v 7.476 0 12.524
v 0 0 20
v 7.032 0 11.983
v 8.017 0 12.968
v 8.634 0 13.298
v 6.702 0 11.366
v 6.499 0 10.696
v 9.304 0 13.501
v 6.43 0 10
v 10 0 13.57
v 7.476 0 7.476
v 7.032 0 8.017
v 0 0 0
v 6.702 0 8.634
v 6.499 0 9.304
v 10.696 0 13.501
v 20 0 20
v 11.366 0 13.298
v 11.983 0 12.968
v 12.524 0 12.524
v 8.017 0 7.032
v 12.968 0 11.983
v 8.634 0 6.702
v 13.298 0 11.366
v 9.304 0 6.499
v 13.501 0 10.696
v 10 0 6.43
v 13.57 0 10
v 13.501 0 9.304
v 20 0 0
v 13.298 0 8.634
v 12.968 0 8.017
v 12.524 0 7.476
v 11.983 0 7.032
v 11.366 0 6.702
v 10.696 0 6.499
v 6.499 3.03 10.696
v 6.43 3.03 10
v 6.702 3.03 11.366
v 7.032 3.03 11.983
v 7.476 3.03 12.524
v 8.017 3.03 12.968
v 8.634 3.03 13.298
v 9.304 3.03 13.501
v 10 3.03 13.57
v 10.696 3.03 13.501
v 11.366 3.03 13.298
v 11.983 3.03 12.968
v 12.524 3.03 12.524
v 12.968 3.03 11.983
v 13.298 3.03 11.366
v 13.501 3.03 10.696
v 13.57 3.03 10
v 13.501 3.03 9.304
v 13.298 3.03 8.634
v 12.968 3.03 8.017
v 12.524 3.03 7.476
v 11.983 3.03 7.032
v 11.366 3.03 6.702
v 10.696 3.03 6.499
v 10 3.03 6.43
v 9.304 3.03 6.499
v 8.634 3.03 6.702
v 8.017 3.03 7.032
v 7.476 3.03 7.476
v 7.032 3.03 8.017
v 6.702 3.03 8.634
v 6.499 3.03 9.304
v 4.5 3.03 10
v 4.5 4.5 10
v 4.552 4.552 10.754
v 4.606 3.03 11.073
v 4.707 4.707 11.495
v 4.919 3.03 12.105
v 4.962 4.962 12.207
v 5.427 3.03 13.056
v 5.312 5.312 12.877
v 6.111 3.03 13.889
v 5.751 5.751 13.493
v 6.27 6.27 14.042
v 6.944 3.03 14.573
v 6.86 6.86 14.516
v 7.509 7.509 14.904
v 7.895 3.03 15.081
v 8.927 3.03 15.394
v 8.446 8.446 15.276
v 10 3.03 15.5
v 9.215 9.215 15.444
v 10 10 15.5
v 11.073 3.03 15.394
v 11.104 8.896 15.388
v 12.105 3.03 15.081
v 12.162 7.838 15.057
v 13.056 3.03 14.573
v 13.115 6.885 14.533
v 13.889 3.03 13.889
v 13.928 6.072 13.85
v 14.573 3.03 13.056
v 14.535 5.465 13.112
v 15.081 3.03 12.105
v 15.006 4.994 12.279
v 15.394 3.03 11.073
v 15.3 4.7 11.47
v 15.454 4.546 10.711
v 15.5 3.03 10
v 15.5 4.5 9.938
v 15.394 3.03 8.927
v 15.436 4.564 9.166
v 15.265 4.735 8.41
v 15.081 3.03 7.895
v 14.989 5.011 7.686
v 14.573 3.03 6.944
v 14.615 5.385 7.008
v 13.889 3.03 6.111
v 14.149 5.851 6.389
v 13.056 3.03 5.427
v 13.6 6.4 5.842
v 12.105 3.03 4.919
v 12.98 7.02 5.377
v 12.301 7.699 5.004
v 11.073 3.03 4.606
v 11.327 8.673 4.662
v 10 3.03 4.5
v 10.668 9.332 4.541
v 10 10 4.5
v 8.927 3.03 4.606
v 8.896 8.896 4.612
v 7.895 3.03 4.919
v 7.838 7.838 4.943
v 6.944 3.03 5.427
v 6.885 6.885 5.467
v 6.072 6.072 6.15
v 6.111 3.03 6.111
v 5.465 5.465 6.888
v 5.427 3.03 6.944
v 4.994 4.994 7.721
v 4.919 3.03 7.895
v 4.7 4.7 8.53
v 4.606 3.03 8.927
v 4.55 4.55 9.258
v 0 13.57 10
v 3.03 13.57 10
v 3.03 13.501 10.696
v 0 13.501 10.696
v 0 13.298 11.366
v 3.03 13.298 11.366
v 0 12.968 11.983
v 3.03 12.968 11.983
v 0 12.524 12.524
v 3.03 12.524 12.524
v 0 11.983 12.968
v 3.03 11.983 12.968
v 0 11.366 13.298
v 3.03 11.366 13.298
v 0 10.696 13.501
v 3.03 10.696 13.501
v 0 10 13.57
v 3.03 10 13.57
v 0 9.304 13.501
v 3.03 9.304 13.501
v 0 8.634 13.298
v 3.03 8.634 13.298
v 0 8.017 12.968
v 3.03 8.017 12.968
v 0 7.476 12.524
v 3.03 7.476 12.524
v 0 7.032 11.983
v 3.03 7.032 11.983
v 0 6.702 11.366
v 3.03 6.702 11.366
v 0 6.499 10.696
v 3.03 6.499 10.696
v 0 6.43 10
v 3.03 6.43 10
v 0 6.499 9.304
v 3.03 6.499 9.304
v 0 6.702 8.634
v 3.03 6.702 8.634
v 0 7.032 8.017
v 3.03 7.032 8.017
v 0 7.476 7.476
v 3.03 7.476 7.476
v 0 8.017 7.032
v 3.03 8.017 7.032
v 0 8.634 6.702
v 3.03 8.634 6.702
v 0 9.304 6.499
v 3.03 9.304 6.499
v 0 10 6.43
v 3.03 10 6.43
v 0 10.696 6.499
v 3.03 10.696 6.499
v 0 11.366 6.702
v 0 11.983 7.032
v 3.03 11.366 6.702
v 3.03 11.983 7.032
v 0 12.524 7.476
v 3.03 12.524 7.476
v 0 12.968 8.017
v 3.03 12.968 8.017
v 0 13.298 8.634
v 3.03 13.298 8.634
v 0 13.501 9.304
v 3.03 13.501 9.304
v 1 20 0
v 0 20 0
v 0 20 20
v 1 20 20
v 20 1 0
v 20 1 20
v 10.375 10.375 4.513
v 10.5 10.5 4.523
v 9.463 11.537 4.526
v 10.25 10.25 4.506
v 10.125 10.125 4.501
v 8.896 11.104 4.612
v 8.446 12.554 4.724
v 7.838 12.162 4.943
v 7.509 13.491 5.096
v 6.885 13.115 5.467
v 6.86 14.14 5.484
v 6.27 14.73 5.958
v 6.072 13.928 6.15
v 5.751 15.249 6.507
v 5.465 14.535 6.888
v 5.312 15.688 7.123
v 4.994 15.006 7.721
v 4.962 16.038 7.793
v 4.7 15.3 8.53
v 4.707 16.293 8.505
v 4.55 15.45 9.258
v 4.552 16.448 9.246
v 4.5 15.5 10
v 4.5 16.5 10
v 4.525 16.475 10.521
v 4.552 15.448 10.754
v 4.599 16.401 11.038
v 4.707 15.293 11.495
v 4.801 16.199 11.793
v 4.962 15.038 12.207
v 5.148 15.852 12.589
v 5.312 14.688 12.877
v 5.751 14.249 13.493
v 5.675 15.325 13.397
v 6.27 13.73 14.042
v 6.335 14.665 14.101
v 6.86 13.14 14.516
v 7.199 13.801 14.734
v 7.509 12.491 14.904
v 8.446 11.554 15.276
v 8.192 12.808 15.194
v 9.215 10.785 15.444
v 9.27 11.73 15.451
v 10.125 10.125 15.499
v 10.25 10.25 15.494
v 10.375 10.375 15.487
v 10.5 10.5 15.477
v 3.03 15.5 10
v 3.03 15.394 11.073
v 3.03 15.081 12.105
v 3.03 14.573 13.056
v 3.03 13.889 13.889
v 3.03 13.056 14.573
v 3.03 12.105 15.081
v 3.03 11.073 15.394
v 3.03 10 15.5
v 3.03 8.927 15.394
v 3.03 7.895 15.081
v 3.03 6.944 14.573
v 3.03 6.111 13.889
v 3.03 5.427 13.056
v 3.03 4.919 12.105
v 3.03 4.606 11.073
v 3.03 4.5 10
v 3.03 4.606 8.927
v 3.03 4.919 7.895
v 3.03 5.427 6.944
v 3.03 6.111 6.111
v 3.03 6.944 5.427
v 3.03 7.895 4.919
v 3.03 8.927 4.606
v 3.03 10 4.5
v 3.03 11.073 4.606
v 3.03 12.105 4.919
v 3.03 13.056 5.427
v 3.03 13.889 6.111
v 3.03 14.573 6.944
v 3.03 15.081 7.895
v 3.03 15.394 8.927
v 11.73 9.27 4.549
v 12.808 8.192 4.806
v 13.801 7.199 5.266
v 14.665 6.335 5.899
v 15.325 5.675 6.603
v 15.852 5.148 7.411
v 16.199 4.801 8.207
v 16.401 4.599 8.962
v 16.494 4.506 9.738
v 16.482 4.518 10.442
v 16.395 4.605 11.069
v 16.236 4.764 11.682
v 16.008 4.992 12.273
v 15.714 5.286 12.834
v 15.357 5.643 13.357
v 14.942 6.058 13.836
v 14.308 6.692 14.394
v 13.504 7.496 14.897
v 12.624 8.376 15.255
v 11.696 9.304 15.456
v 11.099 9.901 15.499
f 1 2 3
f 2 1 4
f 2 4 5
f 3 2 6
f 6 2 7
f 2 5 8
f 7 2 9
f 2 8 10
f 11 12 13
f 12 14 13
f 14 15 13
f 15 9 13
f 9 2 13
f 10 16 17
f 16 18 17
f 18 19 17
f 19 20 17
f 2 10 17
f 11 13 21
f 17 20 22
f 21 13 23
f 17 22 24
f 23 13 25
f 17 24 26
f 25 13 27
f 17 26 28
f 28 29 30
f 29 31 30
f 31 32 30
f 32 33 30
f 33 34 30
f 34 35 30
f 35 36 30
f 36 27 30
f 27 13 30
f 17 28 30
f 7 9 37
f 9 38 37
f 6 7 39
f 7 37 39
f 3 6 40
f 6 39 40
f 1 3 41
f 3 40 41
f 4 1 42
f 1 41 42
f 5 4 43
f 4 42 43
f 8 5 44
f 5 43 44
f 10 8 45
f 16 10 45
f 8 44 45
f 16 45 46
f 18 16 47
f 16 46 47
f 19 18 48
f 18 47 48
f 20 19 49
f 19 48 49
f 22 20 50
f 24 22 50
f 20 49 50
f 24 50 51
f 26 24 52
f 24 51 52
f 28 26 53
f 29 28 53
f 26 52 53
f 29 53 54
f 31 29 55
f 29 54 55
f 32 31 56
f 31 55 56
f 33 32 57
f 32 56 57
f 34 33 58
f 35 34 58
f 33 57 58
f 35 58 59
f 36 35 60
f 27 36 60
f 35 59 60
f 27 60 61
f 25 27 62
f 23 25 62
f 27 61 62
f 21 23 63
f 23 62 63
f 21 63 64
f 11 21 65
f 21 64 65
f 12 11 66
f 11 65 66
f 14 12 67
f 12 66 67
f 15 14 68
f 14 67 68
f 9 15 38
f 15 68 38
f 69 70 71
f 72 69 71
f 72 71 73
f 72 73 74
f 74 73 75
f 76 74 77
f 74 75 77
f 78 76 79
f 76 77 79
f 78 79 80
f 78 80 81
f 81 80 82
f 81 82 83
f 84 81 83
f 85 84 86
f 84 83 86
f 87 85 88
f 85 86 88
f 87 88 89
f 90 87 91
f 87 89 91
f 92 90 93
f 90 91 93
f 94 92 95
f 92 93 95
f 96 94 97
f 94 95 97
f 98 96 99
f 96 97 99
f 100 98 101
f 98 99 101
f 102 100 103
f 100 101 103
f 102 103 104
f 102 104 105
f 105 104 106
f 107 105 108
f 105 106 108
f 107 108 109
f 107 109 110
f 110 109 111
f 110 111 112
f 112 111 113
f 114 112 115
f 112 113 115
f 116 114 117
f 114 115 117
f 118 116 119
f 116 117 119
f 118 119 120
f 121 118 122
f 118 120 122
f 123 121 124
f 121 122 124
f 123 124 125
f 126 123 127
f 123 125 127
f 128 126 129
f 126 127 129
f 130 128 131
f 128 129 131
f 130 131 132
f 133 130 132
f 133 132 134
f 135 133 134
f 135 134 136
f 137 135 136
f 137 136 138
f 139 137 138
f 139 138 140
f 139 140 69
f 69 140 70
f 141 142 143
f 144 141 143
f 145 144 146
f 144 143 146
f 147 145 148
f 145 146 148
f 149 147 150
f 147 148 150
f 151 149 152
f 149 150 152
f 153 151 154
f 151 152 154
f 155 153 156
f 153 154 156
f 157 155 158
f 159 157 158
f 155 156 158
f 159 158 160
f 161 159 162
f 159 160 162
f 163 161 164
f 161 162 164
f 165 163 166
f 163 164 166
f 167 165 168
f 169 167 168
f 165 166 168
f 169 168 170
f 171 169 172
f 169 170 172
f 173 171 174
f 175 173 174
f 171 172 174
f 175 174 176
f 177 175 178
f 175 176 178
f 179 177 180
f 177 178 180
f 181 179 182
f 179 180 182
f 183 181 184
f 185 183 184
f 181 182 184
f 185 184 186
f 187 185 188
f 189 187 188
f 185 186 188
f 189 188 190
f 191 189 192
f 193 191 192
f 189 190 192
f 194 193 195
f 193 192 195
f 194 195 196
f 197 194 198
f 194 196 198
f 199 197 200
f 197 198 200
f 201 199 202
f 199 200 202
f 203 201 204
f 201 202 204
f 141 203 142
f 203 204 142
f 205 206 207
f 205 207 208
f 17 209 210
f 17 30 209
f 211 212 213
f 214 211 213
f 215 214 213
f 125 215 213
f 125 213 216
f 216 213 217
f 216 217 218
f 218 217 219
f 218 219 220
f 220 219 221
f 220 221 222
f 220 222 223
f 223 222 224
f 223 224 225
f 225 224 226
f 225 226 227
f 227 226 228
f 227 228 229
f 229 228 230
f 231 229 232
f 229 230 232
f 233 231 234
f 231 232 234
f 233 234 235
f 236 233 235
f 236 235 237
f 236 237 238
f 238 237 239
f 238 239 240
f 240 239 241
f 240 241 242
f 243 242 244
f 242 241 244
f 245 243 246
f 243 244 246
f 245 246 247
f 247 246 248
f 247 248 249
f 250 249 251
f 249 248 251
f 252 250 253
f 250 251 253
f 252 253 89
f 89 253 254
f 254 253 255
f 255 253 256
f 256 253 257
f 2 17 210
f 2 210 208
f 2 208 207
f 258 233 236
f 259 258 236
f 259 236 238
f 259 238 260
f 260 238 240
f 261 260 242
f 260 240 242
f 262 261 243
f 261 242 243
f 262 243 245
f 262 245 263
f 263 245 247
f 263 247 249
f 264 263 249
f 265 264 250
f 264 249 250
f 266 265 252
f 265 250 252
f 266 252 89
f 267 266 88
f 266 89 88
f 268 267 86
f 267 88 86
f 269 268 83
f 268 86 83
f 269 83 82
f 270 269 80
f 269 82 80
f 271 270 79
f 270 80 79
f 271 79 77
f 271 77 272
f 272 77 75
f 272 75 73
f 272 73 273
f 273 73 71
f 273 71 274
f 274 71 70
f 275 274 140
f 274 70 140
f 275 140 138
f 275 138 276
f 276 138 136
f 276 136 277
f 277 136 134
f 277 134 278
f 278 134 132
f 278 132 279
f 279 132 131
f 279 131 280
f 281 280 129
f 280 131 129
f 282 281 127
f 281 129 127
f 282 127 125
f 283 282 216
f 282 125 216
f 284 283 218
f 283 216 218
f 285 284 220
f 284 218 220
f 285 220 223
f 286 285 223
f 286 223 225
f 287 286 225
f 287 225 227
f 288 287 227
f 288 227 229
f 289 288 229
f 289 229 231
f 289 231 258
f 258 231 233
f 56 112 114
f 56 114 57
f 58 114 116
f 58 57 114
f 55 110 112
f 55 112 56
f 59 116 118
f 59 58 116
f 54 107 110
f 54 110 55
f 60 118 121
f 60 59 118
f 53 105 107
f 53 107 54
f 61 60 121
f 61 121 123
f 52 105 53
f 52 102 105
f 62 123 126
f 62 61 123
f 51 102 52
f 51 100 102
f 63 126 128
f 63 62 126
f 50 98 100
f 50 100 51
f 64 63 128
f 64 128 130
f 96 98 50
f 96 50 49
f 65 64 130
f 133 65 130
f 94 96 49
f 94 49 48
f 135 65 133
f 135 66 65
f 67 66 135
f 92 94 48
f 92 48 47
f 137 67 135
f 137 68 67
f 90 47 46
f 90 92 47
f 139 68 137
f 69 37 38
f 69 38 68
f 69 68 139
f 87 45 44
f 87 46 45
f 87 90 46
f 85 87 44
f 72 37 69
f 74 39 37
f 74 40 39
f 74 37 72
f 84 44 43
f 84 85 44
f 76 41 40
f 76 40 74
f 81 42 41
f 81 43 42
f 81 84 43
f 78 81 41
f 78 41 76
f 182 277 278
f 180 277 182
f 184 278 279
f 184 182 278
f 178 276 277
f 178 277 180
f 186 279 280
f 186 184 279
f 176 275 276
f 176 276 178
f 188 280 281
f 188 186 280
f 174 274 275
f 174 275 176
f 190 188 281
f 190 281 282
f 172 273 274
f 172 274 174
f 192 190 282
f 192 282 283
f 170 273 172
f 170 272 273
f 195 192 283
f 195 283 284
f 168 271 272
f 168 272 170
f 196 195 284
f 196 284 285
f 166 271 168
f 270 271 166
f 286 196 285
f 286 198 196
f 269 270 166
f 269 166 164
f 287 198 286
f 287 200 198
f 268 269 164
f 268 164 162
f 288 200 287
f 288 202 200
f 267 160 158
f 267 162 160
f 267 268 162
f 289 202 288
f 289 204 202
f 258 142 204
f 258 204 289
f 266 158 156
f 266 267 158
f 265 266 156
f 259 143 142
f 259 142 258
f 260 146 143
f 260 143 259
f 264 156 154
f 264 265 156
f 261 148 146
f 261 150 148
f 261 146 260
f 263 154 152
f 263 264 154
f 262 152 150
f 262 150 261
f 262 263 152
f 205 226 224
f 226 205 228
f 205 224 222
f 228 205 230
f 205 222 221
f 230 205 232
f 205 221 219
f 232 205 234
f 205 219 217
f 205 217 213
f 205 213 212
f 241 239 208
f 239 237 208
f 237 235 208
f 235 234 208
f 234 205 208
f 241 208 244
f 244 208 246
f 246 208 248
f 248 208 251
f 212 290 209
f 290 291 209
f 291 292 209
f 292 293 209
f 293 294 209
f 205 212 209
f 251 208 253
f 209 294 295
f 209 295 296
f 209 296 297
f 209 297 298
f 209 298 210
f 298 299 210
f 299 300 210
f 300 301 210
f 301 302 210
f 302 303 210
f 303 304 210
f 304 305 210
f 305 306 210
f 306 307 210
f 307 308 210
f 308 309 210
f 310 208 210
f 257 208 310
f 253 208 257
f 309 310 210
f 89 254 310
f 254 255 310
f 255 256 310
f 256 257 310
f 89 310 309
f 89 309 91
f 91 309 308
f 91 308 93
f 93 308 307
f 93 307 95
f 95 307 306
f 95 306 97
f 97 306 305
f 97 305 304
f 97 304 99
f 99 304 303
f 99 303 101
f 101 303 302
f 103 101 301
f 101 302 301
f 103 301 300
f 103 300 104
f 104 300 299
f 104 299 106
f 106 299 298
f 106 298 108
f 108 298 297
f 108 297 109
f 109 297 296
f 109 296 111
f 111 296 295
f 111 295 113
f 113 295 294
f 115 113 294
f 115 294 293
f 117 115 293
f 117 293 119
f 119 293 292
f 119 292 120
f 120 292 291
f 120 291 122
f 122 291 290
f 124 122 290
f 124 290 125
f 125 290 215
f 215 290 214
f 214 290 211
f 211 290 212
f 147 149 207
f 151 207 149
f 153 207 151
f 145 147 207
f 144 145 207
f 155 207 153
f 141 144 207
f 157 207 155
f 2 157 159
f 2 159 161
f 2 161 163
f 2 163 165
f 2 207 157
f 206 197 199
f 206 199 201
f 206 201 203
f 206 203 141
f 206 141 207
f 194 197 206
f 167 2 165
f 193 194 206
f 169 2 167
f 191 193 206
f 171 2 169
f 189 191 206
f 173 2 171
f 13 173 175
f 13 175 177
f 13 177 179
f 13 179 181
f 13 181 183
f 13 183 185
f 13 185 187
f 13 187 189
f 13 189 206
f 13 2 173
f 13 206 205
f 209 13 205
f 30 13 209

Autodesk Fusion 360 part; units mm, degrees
sketch "Sketch1" plane through (0, 0, 0) normal (0, 1, 0) x (1, 0, 0)
  line L0 (0, 0) -> (20, 0)
  line L1 (20, 0) -> (20, -20)
  line L2 (20, -20) -> (0, -20)
  line L3 (0, -20) -> (0, 0)
  dimension "d2" = 20
  dimension "d3" = 20
extrude "Extrude4" add sketch "Sketch1" along normal blind 20 makes body 1
extrude "Extrude1" add sketch "Sketch1" along normal blind 20 separate body makes body 2
sketch "Sketch2" plane through (0, 20, 0) normal (0, 1, 0) x (-1, 0, 0)
  line L0 (0, 20) -> (-20, 20)
  line L1 (-20, 20) -> (-20, 0)
  line L2 (-20, 0) -> (0, 0)
  line L3 (0, 0) -> (0, 20)
  line L4 (-20, 20) -> (0, 0) construction
  line L5 (0, 20) -> (-20, 0) construction
  circle A0 centre (-10, 10) radius 3.57
  circle A1 centre (-10, 10) radius 5.5
  dimension "d6" = 7.14
  dimension "d19" = 11
sketch "Sketch5" plane through (0, 0, 0) normal (-1, 0, 0) x (0, -1, 0)
  line L0 (0, 0) -> (0, 20)
  line L1 (0, 20) -> (-20, 20)
  line L2 (-20, 20) -> (-20, 0)
  line L3 (-20, 0) -> (0, 0)
sketch "Sketch6" plane through (20, 0, 0) normal (1, 0, 0) x (0, 1, 0)
  line L0 (0, 20) -> (0, 0)
  line L1 (0, 0) -> (20, 0)
  line L2 (20, 0) -> (20, 20)
  line L3 (20, 20) -> (0, 20)
  line L4 (0, 20) -> (20, 0) construction
  line L5 (20, 20) -> (0, 0) construction
  circle A0 centre (10, 10) radius 3.57
  circle A1 centre (10, 10) radius 5.5
  dimension "d14" = 7.14
  dimension "d20" = 11
extrude "Extrude5" cut sketch "Sketch6" against normal blind 20 contours A0 bodies 1 2
extrude "Extrude6" cut sketch "Sketch2" against normal blind 20 contours A0 bodies 1 2
extrude "Extrude7" cut sketch "Sketch2" against normal blind 16.97 contours A1 bodies 1 2
extrude "Extrude8" cut sketch "Sketch6" against normal blind 16.97 contours A1 bodies 1 2
sketch "Sketch8" plane through (0, 0, 20) normal (0, 0, 1) x (-1, 0, 0)
  line L0 (0, 0) -> (-20, 0)
  line L1 (-20, 0) -> (-20, -20)
  line L2 (-20, -20) -> (0, -20)
  line L3 (0, -20) -> (0, 0)
  line L4 (-20, 0) -> (-19, 0)
  line L5 (0, -20) -> (0, -19)
  line L6 (-20, 0) -> (-20, -1)
  line L7 (0, -20) -> (-1, -20)
  line L8 (-1, -20) -> (-20, -1)
  dimension "d27" = 1
  dimension "d28" = 1
  dimension "d29" = 1
  dimension "d30" = 1
extrude "Extrude9" cut sketch "Sketch8" against normal blind 21 contours L1 L2 L8 bodies 1 2
sketch "Sketch3" plane through (0, 0, 0) normal (1, 0, 0) x (0, 1, 0)
sketch "Sketch4" plane through (0, 0, 0) normal (-1, 0, 0) x (0, -1, 0)
  line L0 (0, 0) -> (0, 20)
  line L1 (0, 20) -> (-20, 20)
  line L2 (-20, 20) -> (-20, 0)
  line L3 (-20, 0) -> (0, 0)
  line L4 (0, 0) -> (-20, 20) construction
  line L5 (0, 20) -> (-20, 0) construction
  circle A0 centre (-10, 10) radius 3.57
  dimension "d7" = 7.14
extrude "Extrude2" [suppressed]
extrude "Extrude3" [suppressed]
hidden bodies 1
equation "w = 20 mm"
